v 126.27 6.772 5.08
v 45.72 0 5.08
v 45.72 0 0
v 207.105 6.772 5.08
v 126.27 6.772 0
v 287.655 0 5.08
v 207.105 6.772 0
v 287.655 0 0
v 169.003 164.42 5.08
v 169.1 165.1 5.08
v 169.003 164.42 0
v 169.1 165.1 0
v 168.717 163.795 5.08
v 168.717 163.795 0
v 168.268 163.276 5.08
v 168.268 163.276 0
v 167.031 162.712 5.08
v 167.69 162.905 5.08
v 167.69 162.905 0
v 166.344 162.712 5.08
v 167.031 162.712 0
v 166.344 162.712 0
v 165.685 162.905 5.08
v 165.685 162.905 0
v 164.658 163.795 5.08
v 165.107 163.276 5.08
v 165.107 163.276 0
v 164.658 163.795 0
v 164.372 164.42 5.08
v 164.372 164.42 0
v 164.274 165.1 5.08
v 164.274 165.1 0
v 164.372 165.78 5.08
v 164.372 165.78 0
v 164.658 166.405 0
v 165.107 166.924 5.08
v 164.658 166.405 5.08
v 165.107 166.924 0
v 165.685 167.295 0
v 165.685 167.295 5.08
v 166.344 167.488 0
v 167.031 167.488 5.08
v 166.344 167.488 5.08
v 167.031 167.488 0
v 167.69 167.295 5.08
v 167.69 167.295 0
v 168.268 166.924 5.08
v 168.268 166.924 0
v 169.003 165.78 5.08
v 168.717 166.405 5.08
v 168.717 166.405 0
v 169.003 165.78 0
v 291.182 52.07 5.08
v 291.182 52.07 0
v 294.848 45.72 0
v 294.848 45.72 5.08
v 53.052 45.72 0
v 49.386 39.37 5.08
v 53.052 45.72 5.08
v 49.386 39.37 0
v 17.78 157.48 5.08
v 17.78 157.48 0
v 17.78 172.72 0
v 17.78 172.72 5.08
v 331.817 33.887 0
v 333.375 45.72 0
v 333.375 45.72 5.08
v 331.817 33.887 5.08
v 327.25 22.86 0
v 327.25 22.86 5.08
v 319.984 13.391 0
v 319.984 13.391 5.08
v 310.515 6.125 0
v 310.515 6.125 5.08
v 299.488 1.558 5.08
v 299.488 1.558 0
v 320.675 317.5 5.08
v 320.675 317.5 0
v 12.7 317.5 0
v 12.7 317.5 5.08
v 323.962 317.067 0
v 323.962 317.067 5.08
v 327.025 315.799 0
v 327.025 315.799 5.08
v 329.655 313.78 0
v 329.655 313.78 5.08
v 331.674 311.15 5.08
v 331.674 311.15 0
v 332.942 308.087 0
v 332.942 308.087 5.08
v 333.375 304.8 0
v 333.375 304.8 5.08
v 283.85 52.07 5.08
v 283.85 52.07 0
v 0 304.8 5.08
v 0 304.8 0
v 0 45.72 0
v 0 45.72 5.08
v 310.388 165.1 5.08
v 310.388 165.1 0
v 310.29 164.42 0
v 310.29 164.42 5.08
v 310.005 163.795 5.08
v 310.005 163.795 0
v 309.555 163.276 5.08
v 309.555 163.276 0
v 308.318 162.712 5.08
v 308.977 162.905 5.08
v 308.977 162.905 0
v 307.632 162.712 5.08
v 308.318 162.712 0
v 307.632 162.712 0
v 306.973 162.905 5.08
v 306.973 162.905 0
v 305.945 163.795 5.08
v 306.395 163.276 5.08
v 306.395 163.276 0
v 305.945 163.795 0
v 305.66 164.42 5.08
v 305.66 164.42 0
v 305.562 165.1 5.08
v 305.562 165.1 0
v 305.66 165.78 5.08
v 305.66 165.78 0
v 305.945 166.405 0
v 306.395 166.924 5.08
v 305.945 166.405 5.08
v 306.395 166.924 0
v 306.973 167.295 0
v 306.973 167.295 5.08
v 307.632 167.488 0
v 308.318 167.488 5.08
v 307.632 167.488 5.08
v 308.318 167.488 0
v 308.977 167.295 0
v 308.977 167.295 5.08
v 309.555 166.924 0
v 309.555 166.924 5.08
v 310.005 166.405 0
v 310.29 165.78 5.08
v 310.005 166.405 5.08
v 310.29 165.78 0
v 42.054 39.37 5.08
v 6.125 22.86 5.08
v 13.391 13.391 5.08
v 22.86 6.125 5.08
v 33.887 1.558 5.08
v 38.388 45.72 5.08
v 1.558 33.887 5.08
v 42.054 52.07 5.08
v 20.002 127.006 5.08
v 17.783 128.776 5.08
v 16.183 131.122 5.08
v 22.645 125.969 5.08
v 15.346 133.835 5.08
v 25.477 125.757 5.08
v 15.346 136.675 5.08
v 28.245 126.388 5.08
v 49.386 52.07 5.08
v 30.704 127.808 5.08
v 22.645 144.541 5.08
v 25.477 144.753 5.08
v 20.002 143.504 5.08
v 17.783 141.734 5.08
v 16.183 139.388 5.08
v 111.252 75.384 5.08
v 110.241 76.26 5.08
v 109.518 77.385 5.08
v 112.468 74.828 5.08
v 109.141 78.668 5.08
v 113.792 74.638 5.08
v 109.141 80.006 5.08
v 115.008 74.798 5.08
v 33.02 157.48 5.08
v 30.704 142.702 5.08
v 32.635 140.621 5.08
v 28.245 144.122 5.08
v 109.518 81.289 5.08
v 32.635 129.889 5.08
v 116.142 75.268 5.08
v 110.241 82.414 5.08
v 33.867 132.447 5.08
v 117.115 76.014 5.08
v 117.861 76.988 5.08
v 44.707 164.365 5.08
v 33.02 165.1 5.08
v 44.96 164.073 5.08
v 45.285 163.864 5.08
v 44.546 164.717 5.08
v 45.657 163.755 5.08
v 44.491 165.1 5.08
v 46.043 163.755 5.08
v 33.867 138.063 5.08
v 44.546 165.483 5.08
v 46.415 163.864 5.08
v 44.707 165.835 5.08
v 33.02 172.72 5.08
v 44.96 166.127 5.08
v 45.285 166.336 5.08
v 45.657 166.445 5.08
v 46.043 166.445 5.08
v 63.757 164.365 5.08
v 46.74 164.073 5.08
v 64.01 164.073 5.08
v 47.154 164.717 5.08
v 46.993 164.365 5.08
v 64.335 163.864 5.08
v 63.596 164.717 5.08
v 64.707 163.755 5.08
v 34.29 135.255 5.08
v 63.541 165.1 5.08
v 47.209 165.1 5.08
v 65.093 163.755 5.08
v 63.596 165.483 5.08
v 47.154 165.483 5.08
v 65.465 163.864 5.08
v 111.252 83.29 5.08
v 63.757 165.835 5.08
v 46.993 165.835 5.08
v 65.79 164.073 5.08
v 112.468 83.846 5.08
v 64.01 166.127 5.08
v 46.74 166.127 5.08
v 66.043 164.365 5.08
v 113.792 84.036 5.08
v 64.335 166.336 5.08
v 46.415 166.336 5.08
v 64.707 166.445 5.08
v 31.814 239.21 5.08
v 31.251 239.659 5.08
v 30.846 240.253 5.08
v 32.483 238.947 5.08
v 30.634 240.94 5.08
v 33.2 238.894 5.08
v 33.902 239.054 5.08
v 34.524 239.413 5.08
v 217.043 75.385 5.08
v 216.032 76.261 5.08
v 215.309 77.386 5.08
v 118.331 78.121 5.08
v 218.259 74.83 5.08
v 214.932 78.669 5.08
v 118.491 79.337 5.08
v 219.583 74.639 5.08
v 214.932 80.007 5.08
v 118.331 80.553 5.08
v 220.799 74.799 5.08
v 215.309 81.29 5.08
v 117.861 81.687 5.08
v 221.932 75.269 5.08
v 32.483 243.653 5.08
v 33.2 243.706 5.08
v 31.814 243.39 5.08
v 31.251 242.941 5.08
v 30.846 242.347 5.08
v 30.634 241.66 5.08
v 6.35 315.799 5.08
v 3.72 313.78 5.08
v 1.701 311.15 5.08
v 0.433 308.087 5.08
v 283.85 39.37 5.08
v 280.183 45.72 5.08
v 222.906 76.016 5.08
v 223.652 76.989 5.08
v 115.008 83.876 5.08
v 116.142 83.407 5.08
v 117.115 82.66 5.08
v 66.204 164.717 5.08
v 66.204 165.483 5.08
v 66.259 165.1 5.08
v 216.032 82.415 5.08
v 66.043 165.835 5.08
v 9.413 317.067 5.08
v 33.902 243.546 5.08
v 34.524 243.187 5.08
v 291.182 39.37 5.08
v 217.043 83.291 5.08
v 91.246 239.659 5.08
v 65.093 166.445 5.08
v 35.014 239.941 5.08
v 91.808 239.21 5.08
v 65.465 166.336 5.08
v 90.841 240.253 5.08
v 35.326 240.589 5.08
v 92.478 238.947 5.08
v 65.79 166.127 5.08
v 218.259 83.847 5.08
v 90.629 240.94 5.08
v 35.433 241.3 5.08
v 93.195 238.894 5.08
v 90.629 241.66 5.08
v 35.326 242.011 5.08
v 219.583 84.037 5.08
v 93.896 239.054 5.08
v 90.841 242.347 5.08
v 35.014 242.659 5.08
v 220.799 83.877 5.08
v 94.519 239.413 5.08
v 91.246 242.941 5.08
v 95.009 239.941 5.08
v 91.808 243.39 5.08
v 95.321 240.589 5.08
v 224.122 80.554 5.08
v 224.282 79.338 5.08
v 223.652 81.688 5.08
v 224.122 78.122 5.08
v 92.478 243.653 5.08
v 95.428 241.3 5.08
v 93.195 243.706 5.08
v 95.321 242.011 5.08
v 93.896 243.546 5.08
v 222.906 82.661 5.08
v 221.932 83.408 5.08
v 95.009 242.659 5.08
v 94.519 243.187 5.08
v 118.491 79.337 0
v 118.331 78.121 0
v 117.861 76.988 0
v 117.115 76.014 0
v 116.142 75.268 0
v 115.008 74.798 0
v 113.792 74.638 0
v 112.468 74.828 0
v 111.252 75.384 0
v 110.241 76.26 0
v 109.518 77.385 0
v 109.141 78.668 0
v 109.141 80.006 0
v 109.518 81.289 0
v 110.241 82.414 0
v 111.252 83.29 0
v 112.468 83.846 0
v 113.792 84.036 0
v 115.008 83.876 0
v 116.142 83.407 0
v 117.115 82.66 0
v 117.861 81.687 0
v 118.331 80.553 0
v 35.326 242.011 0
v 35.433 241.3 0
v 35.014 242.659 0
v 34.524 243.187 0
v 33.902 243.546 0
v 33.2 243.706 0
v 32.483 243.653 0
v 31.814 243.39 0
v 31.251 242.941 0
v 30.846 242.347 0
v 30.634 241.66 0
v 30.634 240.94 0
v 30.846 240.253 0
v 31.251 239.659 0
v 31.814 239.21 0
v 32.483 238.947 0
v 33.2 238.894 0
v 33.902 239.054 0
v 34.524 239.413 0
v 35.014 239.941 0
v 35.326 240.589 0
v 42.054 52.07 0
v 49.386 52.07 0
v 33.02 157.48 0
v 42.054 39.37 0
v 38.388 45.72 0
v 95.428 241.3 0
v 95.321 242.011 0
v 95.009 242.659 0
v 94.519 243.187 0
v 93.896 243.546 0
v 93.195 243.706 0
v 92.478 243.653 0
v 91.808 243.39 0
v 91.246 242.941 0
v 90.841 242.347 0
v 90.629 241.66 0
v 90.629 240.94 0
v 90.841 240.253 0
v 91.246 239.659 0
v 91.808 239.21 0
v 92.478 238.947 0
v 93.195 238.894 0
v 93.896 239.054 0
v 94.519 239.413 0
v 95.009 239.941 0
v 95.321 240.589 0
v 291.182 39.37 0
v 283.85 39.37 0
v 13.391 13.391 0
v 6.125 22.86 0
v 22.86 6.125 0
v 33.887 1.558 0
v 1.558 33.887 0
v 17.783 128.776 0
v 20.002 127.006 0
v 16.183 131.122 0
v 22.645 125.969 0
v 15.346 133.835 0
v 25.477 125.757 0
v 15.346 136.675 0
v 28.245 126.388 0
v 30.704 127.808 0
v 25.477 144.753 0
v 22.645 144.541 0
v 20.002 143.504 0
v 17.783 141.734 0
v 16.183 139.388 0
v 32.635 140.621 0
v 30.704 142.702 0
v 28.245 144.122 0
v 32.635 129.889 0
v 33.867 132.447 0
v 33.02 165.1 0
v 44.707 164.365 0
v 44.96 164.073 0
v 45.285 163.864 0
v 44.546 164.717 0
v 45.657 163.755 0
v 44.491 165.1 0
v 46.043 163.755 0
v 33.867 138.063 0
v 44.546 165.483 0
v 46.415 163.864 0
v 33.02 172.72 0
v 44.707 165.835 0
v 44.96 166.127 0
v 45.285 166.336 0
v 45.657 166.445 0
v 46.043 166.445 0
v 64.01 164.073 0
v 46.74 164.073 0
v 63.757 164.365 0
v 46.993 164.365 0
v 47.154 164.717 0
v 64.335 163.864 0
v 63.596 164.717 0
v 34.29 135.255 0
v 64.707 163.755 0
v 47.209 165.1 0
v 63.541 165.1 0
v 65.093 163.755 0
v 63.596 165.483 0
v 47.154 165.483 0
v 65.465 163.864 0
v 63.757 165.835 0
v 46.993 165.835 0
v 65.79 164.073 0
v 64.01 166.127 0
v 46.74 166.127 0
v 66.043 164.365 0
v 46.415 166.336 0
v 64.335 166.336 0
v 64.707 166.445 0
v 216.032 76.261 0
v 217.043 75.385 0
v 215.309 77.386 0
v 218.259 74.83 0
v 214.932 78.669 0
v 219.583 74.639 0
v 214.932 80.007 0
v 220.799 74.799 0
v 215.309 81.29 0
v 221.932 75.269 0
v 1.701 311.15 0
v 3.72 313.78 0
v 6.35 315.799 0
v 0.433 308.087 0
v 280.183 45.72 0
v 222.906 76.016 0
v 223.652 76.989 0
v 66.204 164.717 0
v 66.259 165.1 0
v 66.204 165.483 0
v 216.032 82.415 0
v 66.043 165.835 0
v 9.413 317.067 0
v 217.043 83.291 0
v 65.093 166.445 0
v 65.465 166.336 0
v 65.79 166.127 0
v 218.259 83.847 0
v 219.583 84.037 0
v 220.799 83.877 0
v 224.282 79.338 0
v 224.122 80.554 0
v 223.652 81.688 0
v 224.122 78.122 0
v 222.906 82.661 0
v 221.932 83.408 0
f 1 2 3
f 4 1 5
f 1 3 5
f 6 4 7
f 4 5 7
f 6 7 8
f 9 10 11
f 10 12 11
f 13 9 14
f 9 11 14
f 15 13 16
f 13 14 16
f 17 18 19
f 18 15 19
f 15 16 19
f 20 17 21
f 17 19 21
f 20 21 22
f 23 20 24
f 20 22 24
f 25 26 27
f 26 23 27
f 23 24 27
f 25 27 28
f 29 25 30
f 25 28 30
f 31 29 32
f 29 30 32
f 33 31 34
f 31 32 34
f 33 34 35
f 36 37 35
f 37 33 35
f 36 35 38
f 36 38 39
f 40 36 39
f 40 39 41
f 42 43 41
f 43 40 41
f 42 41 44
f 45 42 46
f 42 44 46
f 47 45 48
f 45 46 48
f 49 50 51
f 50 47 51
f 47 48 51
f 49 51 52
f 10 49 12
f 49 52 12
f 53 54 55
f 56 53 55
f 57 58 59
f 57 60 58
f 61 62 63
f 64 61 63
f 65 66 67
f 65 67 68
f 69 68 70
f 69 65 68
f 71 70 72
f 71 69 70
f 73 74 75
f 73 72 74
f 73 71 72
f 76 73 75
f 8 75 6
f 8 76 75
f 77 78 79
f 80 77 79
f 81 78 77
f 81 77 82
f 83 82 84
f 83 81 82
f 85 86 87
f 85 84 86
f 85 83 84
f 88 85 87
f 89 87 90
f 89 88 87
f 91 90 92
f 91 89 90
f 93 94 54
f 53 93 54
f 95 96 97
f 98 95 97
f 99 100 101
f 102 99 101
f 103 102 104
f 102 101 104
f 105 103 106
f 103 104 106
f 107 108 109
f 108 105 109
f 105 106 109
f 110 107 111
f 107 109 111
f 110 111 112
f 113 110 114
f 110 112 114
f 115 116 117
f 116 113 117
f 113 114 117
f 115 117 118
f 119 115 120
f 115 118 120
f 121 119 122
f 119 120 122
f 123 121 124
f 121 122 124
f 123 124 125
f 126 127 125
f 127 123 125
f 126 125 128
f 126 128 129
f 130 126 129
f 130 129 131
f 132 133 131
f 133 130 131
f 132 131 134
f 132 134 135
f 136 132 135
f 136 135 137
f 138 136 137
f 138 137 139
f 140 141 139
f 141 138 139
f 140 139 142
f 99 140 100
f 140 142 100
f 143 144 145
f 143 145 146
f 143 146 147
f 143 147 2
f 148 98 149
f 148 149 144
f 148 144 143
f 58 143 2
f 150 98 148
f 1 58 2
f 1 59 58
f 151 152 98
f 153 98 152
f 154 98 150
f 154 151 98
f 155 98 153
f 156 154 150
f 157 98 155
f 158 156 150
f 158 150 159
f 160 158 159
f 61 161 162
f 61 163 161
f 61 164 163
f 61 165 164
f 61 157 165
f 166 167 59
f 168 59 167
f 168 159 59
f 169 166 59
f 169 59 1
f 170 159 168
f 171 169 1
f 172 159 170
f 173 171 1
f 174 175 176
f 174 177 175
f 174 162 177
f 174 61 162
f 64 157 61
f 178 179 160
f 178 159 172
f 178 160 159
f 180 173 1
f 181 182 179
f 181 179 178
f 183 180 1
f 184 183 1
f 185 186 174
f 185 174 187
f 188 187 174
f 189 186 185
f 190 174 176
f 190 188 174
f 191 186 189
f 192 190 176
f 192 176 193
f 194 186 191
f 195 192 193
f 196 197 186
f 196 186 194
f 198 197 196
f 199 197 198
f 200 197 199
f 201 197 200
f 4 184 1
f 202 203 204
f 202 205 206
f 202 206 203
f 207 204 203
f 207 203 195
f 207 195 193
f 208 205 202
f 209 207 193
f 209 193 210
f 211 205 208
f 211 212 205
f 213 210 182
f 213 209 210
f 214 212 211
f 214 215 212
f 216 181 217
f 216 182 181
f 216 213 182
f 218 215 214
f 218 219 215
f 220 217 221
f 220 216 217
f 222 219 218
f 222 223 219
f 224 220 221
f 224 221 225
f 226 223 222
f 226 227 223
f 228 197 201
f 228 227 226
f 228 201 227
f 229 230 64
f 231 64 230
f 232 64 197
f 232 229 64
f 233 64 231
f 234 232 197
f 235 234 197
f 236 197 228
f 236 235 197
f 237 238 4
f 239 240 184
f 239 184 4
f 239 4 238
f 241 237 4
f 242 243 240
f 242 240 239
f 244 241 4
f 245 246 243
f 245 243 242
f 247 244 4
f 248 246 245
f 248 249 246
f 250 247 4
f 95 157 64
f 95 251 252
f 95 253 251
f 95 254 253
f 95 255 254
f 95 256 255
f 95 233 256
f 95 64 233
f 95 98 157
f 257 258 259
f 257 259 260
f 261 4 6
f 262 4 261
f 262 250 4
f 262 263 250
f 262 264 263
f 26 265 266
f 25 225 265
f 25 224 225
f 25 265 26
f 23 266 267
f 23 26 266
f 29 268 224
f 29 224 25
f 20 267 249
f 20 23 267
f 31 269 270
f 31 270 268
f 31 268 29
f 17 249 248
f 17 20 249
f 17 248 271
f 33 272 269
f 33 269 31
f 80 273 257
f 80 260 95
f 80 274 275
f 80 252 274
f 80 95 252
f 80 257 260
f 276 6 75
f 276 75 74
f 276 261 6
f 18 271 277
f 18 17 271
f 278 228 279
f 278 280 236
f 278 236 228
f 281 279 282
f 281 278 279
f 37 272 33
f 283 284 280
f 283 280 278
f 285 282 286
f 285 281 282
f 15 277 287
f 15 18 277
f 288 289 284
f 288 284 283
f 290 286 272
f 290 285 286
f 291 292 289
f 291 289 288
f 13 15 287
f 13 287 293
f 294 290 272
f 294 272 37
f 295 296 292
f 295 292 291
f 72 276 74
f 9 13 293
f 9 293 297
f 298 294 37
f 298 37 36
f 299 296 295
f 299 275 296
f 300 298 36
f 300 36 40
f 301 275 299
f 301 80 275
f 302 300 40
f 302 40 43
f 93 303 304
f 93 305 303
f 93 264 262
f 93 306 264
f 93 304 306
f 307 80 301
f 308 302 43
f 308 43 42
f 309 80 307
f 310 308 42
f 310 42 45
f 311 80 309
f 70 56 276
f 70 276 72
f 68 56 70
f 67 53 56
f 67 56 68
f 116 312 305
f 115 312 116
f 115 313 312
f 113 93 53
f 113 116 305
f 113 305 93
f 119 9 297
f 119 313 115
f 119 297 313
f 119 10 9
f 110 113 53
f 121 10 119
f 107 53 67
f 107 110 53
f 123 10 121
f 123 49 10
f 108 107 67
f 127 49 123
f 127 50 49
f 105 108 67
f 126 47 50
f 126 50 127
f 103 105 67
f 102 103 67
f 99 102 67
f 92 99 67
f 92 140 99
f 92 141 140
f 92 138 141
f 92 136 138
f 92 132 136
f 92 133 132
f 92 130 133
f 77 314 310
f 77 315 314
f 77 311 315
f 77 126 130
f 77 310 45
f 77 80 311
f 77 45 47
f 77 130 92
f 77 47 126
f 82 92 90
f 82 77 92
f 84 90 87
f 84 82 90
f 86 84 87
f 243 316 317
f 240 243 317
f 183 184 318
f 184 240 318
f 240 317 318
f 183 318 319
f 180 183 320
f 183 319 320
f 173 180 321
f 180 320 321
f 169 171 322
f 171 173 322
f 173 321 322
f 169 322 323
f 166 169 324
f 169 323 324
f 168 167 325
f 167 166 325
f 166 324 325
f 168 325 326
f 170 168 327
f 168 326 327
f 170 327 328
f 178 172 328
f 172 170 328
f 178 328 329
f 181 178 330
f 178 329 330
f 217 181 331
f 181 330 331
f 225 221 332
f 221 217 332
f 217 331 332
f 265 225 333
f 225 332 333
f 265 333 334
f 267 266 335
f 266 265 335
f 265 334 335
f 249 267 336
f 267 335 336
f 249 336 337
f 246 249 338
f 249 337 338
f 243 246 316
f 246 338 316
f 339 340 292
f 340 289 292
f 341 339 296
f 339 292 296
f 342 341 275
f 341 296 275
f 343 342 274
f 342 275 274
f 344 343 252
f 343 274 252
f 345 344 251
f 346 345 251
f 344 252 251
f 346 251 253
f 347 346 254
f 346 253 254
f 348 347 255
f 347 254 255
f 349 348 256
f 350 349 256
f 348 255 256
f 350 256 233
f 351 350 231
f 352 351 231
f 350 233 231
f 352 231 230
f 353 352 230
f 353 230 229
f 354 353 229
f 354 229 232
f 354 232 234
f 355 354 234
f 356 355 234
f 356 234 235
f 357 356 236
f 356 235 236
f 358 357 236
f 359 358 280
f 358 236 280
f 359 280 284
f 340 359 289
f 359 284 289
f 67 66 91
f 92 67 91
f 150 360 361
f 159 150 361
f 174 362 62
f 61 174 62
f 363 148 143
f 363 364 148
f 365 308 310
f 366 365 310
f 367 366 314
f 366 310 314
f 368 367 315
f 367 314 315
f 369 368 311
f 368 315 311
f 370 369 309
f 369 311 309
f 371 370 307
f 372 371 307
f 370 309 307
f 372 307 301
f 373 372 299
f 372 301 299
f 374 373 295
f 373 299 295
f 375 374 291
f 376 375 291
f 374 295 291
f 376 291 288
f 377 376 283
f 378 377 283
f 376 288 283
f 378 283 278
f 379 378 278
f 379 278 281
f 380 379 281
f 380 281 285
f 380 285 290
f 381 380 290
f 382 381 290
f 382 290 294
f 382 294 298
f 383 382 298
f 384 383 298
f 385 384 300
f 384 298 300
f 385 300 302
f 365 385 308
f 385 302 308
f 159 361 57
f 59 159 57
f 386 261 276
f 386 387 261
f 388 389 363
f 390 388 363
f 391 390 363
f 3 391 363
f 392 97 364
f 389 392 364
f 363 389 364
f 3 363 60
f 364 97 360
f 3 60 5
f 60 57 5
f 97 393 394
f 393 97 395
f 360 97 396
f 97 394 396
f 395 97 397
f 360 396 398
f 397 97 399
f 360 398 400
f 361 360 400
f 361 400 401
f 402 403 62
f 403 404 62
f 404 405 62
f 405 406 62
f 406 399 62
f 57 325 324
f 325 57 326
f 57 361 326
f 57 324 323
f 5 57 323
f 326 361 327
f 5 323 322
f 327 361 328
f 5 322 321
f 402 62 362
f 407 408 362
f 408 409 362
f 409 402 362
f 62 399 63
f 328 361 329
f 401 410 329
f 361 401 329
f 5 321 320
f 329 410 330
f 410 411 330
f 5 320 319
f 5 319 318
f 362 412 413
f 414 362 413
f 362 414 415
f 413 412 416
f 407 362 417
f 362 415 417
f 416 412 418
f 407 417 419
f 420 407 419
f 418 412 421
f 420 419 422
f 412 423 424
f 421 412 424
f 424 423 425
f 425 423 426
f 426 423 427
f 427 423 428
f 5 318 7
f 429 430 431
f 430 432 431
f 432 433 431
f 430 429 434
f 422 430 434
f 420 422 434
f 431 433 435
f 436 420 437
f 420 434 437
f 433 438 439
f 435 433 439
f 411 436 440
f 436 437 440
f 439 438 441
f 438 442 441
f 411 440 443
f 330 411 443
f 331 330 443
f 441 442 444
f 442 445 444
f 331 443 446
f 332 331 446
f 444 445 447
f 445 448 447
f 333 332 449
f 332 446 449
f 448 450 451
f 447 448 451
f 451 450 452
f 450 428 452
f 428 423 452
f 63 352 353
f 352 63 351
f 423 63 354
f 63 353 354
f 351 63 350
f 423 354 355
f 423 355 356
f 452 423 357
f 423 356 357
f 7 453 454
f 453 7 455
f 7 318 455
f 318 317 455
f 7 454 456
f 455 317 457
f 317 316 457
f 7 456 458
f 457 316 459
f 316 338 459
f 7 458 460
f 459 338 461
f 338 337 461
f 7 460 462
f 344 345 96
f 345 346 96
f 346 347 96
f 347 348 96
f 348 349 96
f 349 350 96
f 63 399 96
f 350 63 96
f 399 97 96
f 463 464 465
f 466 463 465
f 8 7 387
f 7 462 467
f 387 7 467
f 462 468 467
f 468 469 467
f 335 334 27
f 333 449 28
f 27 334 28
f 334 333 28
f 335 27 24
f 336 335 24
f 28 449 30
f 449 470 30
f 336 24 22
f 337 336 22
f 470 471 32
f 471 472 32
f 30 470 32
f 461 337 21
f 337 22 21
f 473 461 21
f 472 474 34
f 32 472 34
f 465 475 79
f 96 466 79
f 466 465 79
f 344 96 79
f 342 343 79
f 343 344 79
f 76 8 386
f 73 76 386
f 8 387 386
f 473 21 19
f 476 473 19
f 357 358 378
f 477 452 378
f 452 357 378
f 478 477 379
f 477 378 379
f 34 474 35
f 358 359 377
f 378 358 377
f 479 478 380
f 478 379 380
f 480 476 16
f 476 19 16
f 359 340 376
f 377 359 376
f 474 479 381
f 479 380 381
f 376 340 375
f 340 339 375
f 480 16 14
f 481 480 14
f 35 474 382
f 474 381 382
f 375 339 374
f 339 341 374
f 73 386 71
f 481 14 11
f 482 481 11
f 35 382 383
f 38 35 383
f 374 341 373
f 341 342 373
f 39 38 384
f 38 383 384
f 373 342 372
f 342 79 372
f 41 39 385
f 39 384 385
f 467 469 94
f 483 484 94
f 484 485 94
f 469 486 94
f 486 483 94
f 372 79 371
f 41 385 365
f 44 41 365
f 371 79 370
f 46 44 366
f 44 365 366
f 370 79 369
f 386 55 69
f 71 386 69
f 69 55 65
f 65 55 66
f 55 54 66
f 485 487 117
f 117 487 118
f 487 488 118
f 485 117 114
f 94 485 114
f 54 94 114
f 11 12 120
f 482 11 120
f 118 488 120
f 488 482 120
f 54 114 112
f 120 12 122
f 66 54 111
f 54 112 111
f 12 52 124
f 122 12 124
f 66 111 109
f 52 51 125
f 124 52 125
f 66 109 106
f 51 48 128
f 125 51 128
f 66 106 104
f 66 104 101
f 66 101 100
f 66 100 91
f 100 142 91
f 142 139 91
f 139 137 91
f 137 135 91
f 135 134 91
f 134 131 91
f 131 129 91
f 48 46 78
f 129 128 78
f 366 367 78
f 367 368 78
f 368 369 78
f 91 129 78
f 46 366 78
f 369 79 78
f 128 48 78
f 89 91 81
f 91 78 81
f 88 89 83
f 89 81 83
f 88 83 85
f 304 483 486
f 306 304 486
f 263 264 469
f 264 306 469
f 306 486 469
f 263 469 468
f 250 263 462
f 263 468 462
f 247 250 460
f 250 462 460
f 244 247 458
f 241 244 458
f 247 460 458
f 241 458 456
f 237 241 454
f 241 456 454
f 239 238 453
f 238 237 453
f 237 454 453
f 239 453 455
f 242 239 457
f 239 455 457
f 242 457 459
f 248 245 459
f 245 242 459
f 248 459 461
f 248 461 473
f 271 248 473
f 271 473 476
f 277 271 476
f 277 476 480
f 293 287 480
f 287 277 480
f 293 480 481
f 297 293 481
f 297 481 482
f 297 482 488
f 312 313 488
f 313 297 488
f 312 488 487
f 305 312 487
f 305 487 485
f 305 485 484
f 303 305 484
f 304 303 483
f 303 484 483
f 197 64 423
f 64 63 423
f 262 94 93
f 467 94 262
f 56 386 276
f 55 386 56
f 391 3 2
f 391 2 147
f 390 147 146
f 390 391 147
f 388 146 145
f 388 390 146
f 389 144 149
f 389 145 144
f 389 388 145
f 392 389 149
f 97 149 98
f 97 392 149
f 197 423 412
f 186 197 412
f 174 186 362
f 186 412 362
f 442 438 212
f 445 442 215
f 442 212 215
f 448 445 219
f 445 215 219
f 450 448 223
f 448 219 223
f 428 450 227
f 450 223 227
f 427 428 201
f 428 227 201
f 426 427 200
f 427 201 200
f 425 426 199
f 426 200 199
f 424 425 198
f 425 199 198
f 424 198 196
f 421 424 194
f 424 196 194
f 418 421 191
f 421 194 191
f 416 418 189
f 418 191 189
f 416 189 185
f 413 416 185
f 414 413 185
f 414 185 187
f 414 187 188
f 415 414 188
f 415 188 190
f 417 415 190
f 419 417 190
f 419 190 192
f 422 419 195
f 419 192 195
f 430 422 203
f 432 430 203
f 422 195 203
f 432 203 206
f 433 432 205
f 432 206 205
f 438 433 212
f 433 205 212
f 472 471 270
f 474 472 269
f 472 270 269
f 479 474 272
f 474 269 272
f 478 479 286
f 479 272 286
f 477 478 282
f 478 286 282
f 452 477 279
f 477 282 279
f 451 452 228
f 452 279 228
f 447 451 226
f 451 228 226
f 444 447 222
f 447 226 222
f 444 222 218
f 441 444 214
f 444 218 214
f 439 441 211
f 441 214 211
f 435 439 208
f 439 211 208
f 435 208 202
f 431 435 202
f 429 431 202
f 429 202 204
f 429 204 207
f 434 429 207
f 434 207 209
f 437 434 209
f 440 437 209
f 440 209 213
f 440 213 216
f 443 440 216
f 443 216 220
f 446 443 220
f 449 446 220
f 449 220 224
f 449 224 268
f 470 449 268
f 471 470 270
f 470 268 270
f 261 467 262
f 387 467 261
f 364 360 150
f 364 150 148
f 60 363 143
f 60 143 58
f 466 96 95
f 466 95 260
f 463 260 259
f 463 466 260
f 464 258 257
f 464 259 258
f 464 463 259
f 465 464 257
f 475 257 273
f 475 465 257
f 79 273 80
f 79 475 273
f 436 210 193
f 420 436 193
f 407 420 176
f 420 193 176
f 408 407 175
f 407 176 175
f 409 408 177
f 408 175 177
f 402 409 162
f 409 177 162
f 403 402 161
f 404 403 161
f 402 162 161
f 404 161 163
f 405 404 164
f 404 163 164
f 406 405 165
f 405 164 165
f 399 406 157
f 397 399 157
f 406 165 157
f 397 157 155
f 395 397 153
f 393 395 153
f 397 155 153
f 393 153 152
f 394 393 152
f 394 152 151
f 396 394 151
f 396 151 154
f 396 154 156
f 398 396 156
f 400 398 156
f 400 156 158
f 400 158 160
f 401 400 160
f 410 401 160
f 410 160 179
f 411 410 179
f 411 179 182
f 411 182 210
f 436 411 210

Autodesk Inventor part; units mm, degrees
ref_plane "YZ Plane" through (0, 0, 0) normal (1, 0, 0) x (0, 1, 0)
ref_plane "XZ Plane" through (0, 0, 0) normal (0, 1, 0) x (-1, 0, 0)
ref_plane "XY Plane" through (0, 0, 0) normal (0, 0, 1) x (1, 0, 0)
sketch "Sketch1" plane through (0, 0, 0) normal (0, 0, 1) x (1, 0, 0)
  line L0 (0, 0) -> (333.375, 0)
  line L1 (333.375, 0) -> (333.375, 304.8)
  line L2 (320.675, 317.5) -> (12.7, 317.5)
  line L3 (0, 304.8) -> (0, 0)
  circle A0 centre (45.72, 45.72) radius 45.72
  circle A1 centre (287.655, 45.72) radius 45.72
  line L4 (166.6875, 0) -> (166.6875, 7.62)
  arc A2 (287.655, 0) -> (45.72, 0) centre (166.6875, -956.3695) ccw
  arc A3 (12.7, 317.5) -> (0, 304.8) centre (12.7, 304.8) ccw
  arc A4 (333.375, 304.8) -> (320.675, 317.5) centre (320.675, 304.8) ccw
  circle A5 centre (45.72, 45.72) radius 2.413
  circle A6 centre (287.655, 45.72) radius 2.413
  circle A7 centre (307.975, 165.1) radius 2.413
  line L5 (25.4, 165.1) -> (307.975, 165.1)
  circle A8 centre (166.6875, 165.1) radius 2.413
  line L6 (45.72, 45.72) -> (113.792, 45.72)
  line L7 (287.655, 45.72) -> (219.583, 45.72)
  line L8 (49.3862, 39.37) -> (53.0523, 45.72)
  line L9 (49.3862, 52.07) -> (53.0523, 45.72)
  line L10 (42.0538, 39.37) -> (49.3862, 39.37)
  line L11 (42.0538, 52.07) -> (49.3862, 52.07)
  line L12 (42.0538, 52.07) -> (38.3877, 45.72)
  line L13 (38.3877, 45.72) -> (42.0538, 39.37)
  line L14 (291.1818, 39.37) -> (294.848, 45.72)
  line L15 (291.1818, 52.07) -> (294.848, 45.72)
  line L16 (283.8495, 39.37) -> (291.1818, 39.37)
  line L17 (283.8495, 52.07) -> (291.1818, 52.07)
  line L18 (283.8495, 52.07) -> (280.1833, 45.72)
  line L19 (280.1833, 45.72) -> (283.8495, 39.37)
  line L20 (42.0538, 52.07) -> (49.3862, 39.37)
  line L21 (42.0538, 39.37) -> (49.3862, 52.07)
  line L22 (113.792, 95.337) -> (113.792, 63.3371)
  line L23 (113.792, 45.72) -> (113.792, 63.3371)
  circle A9 centre (113.792, 79.3371) radius 4.699
  ellipse E0 centre (113.792, 63.3371) end of major axis (113.7846, 65.3371) minor radius 2
  line L24 (219.583, 45.72) -> (219.583, 63.3371)
  ellipse E1 centre (219.583, 63.3371) end of major axis (219.5756, 65.3371) minor radius 2
  line L25 (219.583, 95.3392) -> (219.583, 63.3371)
  circle A10 centre (219.583, 79.3382) radius 4.699
  ellipse E2 centre (235.5574, 128.7087) end of major axis (235.56, 127.3562) minor radius 1.3525
  ellipse E3 centre (203.5575, 128.6472) end of major axis (203.5601, 127.2947) minor radius 1.3525
  ellipse E4 centre (219.583, 95.337) end of major axis (219.5791, 97.337) minor radius 2
  ellipse E5 centre (129.4616, 128.6451) end of major axis (129.4642, 127.2925) minor radius 1.3525
  ellipse E6 centre (97.4617, 128.6451) end of major axis (97.4643, 127.2925) minor radius 1.3525
  ellipse E7 centre (113.792, 95.337) end of major axis (113.7881, 97.337) minor radius 2
  line L26 (25.4, 165.1) -> (25.4, 157.48)
  line L27 (25.4, 157.48) -> (17.78, 157.48)
  line L28 (17.78, 157.48) -> (17.78, 165.1)
  line L29 (17.78, 165.1) -> (17.78, 172.72)
  line L30 (17.78, 172.72) -> (33.02, 172.72)
  line L31 (33.02, 172.72) -> (33.02, 157.48)
  line L32 (33.02, 157.48) -> (25.4, 157.48)
  point P0 (333.375, 317.5)
  point P1 (0, 317.5)
  point P2 (0, 0)
  point P3 (333.375, 45.72)
  point P4 (0, 45.72)
  point P5 (45.3639, 35.0229)
  point P6 (45.3639, 35.0229)
  point P7 (287.655, 45.72)
  point P8 (287.655, 45.72)
  point P9 (49.2468, 52.07)
  point P10 (291.1818, 52.07)
  point P11 (49.7423, 75.4671)
  point P12 (291.1818, 64.77)
  point P13 (45.72, 45.72)
  dimension "d176" = 91.44
  dimension "d177" = 91.44
  dimension "d174" = 333.375
  dimension "d175" = 317.5
  dimension "d178" = 7.62
  dimension "d179" = 12.7
  dimension "d180" = 4.826
  dimension "d181" = 4.826
  dimension "d184" = 25.4
  dimension "d185" = 4.826
  dimension "d186" = 25.4
  dimension "d188" = 4.826
  dimension "d193" = 68.072
  dimension "d194" = 68.072
  dimension "d195" = 165.1
  dimension "d206" = 12.7
  dimension "d207" = 12.7
  dimension "d208" = 12.7
  dimension "d209" = 7.3323
  dimension "d210" = 7.3323
  dimension "d211" = 7.3323
  dimension "d212" = 7.3323
  dimension "d213" = 7.3323
  dimension "d214" = 7.3323
  dimension "d215" = 12.7
  dimension "d216" = 12.7
  dimension "d217" = 12.7
  dimension "d218" = 7.3323
  dimension "d219" = 7.3323
  dimension "d220" = 7.3323
  dimension "d221" = 7.3323
  dimension "d222" = 7.3323
  dimension "d223" = 7.3323
  dimension "d224" = 17.6171
  dimension "d225" = 17.6171
  dimension "d226" = 9.398
  dimension "d227" = 9.398
  dimension "d228" = 31.9999
  dimension "d229" = 33.308
  dimension "d230" = 31.9999
  dimension "d231" = 33.308
  dimension "d232" = 15.6696
  dimension "d233" = 16.0255
  dimension "d234" = 31.9999
  dimension "d235" = 31.9999
  dimension "d236" = 180
  dimension "d237" = 0
  dimension "d258" = 7.62
  dimension "d259" = 7.62
  dimension "d260" = 7.62
  dimension "d261" = 7.62
  dimension "d262" = 15.24
extrude "Extrusion1" add sketch "Sketch1" along normal blind 5.08 contours A0 A2 | E7 | E0 L22 L23 | L23 L22 E0 | E4 | E1 L25 L24 | L24 L25 E1 | L3 A3 L2 A4 L1 A1 A2 A0 | A2 A1 | E2 | E3 | E5 | E6 picked at (16.5244, 31.421) picked at (316.8042, 60.019)
sketch "Sketch8" plane through (0, 0, 5.08) normal (0, 0, 1) x (1, 0, 0)
  line L0 (33.02, 172.72) -> (33.02, 157.48) projected
  line L1 (33.02, 157.48) -> (33.02, 165.1)
  line L2 (33.02, 165.1) -> (45.72, 165.1)
  line L3 (45.72, 165.1) -> (64.77, 165.1)
  circle A0 centre (64.9, 165.1) radius 1.3589
  circle A1 centre (45.85, 165.1) radius 1.3589
  line L4 (33.02, 165.1) -> (25.273, 165.1)
  line L5 (17.78, 157.48) -> (17.78, 172.72) projected
  point P0 (0, 0)
  dimension "d263" = 12.7
  dimension "d264" = 19.05
  dimension "d267" = 2.7178
  dimension "d268" = 2.7178
  dimension "d271" = 7.747
extrude "Extrusion8" cut sketch "Sketch8" against normal blind 28.5115
sketch "Sketch7" plane through (0, 0, 5.08) normal (0, 0, 1) x (1, 0, 0)
  line L0 (0, 304.8) -> (0, 45.72) projected
  line L1 (320.675, 317.5) -> (12.7, 317.5) projected
  circle A0 centre (33.02, 241.3) radius 2.413
  circle A1 centre (93.0148, 241.3) radius 2.413
  point P0 (0, 0)
  dimension "d243" = 4.826
  dimension "d244" = 4.826
  dimension "d245" = 76.2
  dimension "d246" = 33.02
  dimension "d247" = 59.9948
  dimension "d248" = 76.2
extrude "Extrusion10" cut sketch "Sketch7" against normal through all
sketch "Sketch9" plane through (0, 0, 5.08) normal (0, 0, 1) x (1, 0, 0)
  circle A0 centre (24.765, 135.255) radius 9.525
  line L0 (33.02, 157.48) -> (17.78, 157.48) projected
  line L1 (0, 304.8) -> (0, 45.72) projected
  point P0 (0, 0)
  dimension "d276" = 19.05
  dimension "d277" = 12.7
  dimension "d278" = 15.24
extrude "Extrusion11" cut sketch "Sketch9" against normal through all
sketch "Sketch10" plane through (0, 0, 0) normal (0, 0, -1) x (-1, 0, 0)
  line L0 (-190.5, 318.5819) -> (-190.5, 280.4819)
  line L1 (0, 304.8) -> (0, 45.72) projected
  circle A0 centre (-190.5, 280.4819) radius 3.175
  circle A1 centre (-38.1866, 267.5069) radius 1.7 projected
  line L2 (-190.5, 280.4819) -> (-38.1866, 267.5069)
  line L3 (-190.5, 280.4819) -> (-38.1866, 280.4819)
  line L4 (-38.1866, 280.4819) -> (-38.1866, 267.5069)
  line L5 (-190.5, 280.4819) -> (-51.9643, 215.8816)
  circle A2 centre (-51.9643, 215.8816) radius 2.4291
  point P0 (0, 0)
  dimension "d282" = 38.1
  dimension "d283" = 190.5
  dimension "d284" = 6.35
  dimension "d287" = 4.869
  dimension "d288" = 152.8651
  dimension "d289" = 152.8572
  dimension "d290" = 25
properties part number "FTC Outside Panels" material "Wood (Oak)"
